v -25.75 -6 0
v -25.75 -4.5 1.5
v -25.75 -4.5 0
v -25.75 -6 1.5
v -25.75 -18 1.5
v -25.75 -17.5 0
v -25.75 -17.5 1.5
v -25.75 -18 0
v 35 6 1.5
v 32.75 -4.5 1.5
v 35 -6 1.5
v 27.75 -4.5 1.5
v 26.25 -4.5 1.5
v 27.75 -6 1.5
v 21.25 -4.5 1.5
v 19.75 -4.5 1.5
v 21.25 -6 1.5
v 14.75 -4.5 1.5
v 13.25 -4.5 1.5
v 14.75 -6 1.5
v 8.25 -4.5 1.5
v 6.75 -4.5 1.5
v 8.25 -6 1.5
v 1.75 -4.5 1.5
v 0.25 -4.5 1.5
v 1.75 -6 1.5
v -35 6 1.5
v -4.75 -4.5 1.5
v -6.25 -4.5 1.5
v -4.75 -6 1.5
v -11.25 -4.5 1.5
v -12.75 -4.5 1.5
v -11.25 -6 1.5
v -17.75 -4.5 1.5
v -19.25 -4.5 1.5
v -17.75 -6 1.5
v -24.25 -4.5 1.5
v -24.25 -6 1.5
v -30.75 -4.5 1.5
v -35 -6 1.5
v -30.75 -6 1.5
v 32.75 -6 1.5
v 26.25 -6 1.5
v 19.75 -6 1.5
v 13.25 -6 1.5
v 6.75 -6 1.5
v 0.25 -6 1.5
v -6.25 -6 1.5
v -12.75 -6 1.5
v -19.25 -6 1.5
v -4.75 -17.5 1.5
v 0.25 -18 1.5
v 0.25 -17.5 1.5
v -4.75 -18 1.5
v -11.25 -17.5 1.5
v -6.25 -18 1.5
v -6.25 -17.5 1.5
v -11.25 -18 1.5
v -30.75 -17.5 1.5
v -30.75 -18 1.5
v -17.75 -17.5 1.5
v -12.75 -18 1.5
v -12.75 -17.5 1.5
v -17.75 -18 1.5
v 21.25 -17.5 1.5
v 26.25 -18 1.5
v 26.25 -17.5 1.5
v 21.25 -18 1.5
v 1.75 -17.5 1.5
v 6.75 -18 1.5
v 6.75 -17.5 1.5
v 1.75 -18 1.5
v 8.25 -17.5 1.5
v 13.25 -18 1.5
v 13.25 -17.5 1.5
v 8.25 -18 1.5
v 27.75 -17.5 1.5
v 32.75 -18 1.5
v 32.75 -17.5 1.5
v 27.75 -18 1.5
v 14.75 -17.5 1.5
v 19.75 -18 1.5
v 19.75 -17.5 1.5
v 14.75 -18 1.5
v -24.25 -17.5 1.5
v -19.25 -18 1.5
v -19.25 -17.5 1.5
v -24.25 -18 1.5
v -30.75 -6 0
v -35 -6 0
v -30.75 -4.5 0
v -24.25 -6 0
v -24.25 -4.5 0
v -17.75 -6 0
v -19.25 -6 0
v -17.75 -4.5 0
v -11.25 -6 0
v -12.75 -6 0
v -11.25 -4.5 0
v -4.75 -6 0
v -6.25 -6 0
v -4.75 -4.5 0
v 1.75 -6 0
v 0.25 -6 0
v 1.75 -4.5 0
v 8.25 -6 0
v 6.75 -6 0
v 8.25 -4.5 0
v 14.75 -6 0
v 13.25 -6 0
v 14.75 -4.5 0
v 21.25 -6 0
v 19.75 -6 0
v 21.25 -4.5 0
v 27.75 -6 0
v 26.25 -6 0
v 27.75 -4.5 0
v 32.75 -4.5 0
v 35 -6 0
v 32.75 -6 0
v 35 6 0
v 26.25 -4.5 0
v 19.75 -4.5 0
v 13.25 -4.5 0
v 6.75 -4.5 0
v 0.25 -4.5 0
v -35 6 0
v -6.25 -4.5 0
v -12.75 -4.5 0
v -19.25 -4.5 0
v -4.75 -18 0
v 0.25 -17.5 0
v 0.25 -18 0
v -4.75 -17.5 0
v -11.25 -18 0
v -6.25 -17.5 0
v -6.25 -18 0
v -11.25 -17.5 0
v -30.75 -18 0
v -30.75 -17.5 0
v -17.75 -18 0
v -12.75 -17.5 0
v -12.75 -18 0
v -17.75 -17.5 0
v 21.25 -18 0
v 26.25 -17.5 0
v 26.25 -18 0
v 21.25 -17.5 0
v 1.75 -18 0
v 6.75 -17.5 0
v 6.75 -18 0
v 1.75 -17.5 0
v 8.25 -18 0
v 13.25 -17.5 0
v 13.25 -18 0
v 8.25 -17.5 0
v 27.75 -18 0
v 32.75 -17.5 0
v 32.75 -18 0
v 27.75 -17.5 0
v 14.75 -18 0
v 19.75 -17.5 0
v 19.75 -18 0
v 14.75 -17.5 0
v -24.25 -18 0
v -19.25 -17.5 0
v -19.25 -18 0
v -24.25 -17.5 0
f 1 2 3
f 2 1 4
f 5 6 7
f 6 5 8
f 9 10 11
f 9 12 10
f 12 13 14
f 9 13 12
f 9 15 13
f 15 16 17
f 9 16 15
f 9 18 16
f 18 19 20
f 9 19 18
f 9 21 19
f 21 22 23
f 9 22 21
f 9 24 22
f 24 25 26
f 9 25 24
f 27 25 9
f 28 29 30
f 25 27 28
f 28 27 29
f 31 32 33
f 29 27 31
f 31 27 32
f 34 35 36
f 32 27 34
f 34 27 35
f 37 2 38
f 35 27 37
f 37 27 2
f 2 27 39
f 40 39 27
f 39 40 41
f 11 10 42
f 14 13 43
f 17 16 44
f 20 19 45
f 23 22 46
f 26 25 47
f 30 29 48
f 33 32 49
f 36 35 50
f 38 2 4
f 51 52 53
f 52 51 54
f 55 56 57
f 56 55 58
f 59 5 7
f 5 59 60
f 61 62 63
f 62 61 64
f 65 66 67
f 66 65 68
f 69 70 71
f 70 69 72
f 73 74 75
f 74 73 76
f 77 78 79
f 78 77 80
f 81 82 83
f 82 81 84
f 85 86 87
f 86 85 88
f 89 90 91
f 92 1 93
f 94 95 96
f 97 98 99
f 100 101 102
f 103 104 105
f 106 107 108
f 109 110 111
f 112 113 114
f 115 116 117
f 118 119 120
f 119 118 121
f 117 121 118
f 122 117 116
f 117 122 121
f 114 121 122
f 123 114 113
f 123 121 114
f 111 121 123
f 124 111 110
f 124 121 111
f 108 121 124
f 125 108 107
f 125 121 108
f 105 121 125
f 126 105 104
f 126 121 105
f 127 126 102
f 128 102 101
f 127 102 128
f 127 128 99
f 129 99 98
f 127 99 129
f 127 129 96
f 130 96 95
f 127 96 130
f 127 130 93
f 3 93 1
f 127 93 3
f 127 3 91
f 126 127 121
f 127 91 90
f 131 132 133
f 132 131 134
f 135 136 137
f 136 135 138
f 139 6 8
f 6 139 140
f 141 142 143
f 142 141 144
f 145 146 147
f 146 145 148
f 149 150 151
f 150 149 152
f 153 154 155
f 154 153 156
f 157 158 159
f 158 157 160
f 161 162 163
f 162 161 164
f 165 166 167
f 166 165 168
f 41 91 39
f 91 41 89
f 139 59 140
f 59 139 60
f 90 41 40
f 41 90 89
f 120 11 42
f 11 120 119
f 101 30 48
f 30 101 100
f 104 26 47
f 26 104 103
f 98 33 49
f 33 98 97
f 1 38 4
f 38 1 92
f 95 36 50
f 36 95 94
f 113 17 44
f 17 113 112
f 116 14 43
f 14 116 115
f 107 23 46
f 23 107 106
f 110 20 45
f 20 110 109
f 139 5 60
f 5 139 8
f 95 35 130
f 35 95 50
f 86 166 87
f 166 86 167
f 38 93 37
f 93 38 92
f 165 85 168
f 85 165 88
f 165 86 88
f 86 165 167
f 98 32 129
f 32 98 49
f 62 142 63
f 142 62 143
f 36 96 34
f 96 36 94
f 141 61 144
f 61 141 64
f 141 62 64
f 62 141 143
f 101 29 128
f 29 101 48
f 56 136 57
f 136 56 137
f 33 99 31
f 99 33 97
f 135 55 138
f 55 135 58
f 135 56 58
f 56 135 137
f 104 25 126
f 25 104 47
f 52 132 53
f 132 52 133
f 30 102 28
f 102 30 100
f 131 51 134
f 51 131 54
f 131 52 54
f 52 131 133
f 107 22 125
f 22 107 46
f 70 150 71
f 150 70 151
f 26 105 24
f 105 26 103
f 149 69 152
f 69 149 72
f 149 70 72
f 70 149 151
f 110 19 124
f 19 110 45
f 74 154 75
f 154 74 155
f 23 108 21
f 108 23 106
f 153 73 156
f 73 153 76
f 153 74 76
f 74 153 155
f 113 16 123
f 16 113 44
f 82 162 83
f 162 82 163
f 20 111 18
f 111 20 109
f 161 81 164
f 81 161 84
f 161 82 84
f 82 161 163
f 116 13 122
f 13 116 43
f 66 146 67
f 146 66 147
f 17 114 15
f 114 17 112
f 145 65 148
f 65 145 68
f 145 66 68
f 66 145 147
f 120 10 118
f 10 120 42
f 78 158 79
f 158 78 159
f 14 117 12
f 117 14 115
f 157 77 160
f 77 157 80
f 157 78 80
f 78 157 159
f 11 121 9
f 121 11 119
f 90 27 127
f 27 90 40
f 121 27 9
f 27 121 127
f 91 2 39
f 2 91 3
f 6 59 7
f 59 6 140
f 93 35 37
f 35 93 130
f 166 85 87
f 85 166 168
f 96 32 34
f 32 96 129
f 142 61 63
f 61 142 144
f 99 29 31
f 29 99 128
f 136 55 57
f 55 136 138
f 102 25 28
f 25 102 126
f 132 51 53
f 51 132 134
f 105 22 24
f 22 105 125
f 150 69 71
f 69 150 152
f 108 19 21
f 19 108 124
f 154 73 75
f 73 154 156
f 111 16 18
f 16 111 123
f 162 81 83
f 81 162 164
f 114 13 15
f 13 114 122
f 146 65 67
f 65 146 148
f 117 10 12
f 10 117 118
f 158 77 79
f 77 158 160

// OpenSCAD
// 10-well comb for agarose gel casting, printed lying flat
// Units: mm

// ---- Spine ----
spine_len   = 70;   // spine length along X
spine_wid   = 12;   // spine width along Y
spine_thk   = 1.5;  // spine thickness along Z

// ---- Teeth ----
tooth_count = 10;   // number of teeth
tooth_wid   = 5.0;  // tooth width along X
tooth_len   = 12;   // tooth length along Y (overlaps spine)
gap         = 1.5;  // gap between neighbouring teeth

// ---- Misc ----
eps         = 0.5;  // cutter overshoot past faces
$fn         = 64;

// Derived
pitch       = tooth_wid + gap;                 // centre-to-centre spacing
row_span    = (tooth_count - 1) * gap;         // distance from first to last tooth edge
x_start     = -spine_len / 2 + row_span / 2;   // first tooth left edge (row centred)

difference() {
    // Plate: spine + teeth, all in the same flat layer
    union() {
        translate([-spine_len / 2, -spine_wid / 2, 0])
            cube([spine_len, spine_wid, spine_thk]);
        for (i = [0 : tooth_count - 1])
            translate([x_start + i * pitch - tooth_wid / 2,
                       -spine_wid / 2 - tooth_len,
                       0])
                cube([tooth_wid, tooth_len, spine_thk]);
    }

    // Cut out the wells (through the plate, past both faces)
    for (i = [0 : tooth_count - 1])
        translate([x_start + i * pitch - tooth_wid / 2,
                   -spine_wid / 2 - tooth_len + eps,
                   -eps])
            cube([tooth_wid, tooth_len + 2 * eps, spine_thk + 2 * eps]);
}
